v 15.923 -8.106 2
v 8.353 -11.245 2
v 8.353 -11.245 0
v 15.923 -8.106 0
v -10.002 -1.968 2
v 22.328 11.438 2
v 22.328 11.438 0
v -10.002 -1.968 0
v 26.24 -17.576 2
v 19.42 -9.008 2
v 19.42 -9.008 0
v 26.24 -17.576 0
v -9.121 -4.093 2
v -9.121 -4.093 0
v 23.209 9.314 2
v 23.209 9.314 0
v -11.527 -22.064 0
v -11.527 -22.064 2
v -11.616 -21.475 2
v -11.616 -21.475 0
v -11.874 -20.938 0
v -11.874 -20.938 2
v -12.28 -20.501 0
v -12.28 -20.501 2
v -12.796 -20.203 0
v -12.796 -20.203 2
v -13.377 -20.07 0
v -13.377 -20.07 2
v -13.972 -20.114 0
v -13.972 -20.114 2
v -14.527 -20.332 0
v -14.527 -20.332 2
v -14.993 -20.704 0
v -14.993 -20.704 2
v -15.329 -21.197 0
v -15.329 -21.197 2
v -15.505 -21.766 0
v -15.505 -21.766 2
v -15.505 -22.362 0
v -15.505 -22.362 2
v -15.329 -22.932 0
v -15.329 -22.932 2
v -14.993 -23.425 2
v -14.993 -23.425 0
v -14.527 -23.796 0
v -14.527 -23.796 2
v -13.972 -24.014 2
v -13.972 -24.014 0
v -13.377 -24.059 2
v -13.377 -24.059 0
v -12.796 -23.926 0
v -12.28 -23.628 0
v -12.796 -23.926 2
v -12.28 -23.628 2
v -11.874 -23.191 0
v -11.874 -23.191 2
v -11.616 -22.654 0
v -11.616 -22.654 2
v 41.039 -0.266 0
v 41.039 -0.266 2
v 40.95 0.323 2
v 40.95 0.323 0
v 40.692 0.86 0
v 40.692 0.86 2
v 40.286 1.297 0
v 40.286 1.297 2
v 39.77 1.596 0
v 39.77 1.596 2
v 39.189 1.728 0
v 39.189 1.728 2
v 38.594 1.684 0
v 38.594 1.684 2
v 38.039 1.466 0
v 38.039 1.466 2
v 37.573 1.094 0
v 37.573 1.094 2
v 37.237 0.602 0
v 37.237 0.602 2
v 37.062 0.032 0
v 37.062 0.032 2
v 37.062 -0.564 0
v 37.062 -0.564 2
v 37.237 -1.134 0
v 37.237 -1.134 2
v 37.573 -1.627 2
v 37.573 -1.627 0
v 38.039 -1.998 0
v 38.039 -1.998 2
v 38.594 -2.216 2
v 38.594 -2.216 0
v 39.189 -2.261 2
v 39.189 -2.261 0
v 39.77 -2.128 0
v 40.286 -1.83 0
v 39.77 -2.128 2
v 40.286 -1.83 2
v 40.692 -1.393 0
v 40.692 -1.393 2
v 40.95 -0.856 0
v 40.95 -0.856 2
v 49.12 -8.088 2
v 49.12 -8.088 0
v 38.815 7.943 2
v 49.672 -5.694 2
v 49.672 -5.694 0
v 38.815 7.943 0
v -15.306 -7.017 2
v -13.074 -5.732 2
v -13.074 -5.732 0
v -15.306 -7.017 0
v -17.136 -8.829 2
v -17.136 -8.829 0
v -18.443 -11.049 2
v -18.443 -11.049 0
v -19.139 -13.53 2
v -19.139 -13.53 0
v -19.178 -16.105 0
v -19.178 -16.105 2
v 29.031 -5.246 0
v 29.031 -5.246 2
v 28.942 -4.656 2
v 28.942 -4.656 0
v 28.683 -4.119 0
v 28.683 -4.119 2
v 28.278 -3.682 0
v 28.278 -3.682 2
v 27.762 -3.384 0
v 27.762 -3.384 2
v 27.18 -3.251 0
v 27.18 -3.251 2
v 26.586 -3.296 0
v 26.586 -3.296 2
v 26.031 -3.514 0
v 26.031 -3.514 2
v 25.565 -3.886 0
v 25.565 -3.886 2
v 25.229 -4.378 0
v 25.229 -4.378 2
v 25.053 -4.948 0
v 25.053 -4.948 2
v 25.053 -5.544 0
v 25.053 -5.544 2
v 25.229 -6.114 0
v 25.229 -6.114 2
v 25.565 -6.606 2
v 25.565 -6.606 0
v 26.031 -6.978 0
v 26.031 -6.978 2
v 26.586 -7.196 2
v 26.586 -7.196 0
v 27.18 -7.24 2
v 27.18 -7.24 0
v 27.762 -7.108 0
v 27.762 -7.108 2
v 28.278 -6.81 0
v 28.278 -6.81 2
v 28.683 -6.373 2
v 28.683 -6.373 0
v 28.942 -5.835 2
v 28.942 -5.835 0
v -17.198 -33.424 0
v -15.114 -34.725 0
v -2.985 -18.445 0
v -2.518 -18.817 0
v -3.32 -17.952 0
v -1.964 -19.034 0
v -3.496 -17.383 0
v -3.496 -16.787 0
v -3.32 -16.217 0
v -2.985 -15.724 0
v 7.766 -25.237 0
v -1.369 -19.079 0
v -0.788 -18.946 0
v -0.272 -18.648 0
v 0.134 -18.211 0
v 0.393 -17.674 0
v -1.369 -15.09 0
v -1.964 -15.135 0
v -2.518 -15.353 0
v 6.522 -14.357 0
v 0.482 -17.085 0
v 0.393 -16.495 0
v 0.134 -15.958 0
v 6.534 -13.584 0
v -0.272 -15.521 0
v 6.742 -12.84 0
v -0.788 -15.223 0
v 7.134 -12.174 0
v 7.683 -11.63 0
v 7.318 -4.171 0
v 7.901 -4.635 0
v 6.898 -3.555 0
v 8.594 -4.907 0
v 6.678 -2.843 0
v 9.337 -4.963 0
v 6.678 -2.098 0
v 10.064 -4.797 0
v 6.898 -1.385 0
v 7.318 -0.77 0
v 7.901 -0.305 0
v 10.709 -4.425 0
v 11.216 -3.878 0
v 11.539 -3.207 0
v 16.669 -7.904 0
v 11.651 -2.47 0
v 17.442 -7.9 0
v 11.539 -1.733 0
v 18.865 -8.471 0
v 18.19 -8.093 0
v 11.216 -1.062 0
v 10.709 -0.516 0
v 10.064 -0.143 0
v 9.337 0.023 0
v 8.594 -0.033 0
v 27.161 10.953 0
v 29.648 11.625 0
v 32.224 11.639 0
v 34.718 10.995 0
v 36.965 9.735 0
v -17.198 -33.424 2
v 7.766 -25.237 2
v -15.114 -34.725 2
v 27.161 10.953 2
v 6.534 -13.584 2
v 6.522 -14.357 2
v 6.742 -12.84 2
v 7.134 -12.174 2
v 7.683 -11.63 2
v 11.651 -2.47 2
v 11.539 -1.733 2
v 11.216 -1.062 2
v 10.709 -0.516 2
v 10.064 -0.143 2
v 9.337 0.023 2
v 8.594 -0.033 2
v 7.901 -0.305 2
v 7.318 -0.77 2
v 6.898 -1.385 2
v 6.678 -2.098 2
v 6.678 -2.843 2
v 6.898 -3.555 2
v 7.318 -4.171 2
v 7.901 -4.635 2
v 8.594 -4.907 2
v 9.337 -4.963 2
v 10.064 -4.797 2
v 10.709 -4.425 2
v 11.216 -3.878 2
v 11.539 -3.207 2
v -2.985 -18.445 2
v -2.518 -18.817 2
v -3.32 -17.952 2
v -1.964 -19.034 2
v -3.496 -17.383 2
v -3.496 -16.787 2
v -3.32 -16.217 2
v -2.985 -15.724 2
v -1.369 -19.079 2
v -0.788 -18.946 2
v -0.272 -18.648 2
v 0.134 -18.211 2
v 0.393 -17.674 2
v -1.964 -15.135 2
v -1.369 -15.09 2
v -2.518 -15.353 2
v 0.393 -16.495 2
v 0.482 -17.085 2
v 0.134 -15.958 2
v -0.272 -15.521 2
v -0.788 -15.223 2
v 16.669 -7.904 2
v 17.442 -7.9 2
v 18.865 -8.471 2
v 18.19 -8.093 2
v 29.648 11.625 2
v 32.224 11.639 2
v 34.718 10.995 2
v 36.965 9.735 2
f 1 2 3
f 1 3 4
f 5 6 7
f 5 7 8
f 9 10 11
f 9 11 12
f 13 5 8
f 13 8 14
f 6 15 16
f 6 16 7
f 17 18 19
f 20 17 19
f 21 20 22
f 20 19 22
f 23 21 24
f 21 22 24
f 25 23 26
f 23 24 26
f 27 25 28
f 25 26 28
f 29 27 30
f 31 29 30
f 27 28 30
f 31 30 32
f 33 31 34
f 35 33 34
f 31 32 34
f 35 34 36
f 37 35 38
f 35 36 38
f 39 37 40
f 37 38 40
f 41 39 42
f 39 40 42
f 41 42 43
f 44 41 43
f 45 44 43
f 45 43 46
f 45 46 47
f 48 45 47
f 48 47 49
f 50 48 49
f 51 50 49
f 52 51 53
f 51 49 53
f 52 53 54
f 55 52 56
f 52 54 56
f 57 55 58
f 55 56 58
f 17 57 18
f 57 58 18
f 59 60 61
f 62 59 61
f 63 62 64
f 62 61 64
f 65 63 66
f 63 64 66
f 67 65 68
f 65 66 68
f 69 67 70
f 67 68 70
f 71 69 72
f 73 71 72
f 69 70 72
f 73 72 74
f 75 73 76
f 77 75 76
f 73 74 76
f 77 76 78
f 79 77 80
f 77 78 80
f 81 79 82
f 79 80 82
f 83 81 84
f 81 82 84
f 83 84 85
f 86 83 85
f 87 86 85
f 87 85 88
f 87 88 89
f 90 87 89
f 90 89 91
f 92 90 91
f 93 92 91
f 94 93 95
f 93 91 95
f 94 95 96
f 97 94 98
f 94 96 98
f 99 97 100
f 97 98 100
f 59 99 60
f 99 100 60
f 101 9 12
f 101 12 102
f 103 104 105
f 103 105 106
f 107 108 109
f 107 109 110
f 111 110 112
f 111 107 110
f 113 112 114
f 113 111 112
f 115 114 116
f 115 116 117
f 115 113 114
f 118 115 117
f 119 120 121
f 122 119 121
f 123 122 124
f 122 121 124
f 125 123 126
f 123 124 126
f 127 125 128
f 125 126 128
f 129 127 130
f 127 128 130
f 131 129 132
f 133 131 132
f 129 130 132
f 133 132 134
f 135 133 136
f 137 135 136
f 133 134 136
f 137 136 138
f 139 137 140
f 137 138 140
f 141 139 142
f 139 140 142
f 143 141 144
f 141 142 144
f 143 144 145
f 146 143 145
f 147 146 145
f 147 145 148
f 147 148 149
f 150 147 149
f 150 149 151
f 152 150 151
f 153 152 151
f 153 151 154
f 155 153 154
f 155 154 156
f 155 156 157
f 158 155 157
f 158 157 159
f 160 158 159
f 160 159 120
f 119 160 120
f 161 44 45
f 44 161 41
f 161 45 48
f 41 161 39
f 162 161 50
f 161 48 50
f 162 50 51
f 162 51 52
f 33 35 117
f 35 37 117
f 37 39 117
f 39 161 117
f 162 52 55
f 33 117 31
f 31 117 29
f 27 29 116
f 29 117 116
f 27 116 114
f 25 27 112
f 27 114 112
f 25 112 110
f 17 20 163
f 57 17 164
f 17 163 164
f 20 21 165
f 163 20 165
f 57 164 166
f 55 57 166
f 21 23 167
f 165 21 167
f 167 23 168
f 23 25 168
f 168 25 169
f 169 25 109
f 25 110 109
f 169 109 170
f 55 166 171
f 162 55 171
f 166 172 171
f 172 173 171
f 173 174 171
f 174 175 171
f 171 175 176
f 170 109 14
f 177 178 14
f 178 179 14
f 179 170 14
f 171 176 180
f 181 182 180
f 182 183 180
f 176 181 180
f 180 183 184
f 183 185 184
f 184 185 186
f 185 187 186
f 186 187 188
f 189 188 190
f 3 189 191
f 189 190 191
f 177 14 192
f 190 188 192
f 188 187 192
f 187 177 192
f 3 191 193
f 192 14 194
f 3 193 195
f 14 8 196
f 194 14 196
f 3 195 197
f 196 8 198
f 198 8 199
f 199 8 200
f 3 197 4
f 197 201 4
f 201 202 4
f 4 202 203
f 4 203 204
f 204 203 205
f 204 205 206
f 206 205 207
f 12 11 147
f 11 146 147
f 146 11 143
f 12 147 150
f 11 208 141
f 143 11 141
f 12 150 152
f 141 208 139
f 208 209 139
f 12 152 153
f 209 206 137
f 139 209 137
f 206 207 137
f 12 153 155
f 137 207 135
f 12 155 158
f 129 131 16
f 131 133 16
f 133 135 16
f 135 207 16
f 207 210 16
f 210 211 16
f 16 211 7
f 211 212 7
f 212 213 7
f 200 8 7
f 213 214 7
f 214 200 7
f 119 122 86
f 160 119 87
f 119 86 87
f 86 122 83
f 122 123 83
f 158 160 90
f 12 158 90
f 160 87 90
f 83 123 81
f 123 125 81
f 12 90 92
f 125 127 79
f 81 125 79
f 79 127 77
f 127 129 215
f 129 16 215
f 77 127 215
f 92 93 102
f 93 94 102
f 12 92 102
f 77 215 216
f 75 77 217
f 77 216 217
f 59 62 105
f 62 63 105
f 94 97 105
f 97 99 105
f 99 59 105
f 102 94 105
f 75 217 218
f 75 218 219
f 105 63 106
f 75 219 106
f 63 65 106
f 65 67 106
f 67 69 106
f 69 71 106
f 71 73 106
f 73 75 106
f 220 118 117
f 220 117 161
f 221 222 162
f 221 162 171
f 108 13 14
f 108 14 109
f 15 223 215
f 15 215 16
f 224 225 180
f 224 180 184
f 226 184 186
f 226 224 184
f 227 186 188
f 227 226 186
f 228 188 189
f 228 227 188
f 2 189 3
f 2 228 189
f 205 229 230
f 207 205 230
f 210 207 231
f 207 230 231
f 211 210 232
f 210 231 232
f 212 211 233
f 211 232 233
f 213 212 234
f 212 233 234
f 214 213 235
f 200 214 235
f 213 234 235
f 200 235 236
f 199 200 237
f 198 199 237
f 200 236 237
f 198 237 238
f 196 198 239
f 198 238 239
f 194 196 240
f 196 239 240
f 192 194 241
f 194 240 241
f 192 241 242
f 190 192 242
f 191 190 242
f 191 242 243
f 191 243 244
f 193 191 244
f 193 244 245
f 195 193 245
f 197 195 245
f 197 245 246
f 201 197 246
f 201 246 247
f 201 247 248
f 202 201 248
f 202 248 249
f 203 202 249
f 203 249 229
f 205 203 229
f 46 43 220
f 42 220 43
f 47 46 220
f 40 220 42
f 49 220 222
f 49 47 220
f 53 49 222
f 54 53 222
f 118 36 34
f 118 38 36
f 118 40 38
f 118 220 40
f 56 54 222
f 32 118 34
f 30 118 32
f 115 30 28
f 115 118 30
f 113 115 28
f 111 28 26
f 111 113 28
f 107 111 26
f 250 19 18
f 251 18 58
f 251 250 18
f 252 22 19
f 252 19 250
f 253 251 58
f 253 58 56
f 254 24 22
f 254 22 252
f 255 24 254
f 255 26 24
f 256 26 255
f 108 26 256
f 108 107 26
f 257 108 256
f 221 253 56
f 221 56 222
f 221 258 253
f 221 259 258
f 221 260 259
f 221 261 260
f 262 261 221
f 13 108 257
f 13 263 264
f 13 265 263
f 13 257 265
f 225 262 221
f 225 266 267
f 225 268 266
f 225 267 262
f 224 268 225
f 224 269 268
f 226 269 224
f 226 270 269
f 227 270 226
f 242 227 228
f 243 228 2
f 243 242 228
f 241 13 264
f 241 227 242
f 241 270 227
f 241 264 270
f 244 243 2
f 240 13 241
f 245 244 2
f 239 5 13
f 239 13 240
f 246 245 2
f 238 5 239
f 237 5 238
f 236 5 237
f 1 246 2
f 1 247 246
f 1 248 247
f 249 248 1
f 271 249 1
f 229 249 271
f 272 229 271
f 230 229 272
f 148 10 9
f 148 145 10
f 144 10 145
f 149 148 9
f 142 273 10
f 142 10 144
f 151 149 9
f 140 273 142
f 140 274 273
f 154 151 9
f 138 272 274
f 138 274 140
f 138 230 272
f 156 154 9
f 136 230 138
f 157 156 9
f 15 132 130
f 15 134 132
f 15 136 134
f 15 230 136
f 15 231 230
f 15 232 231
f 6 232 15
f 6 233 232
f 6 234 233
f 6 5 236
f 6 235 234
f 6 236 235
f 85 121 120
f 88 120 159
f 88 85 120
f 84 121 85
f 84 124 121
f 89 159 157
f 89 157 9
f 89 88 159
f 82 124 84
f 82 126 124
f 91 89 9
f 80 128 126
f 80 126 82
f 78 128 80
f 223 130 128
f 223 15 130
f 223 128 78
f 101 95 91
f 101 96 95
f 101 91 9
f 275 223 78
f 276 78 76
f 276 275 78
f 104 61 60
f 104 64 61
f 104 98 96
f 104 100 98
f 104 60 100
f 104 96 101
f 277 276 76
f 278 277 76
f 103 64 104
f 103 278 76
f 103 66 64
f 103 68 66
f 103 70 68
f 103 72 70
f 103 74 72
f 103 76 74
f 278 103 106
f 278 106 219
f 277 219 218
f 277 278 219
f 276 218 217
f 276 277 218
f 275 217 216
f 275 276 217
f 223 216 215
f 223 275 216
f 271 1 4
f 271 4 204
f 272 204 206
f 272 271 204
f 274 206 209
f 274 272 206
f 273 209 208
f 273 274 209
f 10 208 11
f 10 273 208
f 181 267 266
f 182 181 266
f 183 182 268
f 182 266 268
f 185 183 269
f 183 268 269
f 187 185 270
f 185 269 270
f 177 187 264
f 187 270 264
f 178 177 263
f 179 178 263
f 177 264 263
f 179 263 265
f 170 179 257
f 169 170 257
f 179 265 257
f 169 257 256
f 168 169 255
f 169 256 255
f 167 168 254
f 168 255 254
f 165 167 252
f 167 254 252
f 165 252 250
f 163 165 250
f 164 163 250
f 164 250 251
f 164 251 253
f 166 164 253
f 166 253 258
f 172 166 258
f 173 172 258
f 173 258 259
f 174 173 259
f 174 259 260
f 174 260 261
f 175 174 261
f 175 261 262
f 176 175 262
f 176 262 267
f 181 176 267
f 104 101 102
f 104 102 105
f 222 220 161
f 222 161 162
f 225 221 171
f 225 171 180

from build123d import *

# Parameters (mm, degrees)
SKETCH_1_W          = 178.1038796
SKETCH_1_H          = 112.631890056
EXTRUDE_1_DEPTH     = 2
SKETCH_2_OUTSIDE_W  = 222.252
SKETCH_2_OUTSIDE_H  = 156.78
CUT_EXTRUDE_1_DEPTH = 2
SKETCH_3_R          = 2
CUT_EXTRUDE_2_DEPTH = 2
SKETCH_4_R          = 2
CUT_EXTRUDE_3_DEPTH = 10
SKETCH_5_R          = 2.5
CUT_EXTRUDE_4_DEPTH = 10


with BuildPart() as part:
    # 草图1 → 凸台-拉伸1 (new body)
    with BuildSketch(Plane.XY):
        Rectangle(SKETCH_1_W, SKETCH_1_H)
    extrude(amount=EXTRUDE_1_DEPTH)

    # 草图2 outside → 切除-拉伸1 (cut)
    with BuildSketch(Plane.XY.offset(2)):
        Rectangle(SKETCH_2_OUTSIDE_W, SKETCH_2_OUTSIDE_H)
        with BuildLine():
            Line((19.419678114, -9.00835621), (26.240314518, -17.576109786))
            Line((26.240314518, -17.576109786), (49.120442624, -8.088240876))
            Line((49.120442624, -8.088240876), (49.672051155, -5.694361888))
            Line((49.672051155, -5.694361888), (38.815198664, 7.943491127))
            ThreePointArc((38.815198664, 7.943491127), (33.491549784, 11.397714714), (27.161091097, 10.952528456))
            Line((27.161091097, 10.952528456), (23.209000469, 9.31368633))
            Line((23.209000469, 9.31368633), (22.32798775, 11.438260779))
            Line((22.32798775, 11.438260779), (-10.002492997, -1.968454504))
            Line((-10.002492997, -1.968454504), (-9.121480278, -4.093028953))
            Line((-9.121480278, -4.093028953), (-13.073570906, -5.731871079))
            ThreePointArc((-13.073570906, -5.731871079), (-17.86138023, -9.897177774), (-19.178350627, -16.105115191))
            Line((-19.178350627, -16.105115191), (-17.198178577, -33.42392576))
            Line((-17.198178577, -33.42392576), (-15.114374014, -34.724958857))
            Line((-15.114374014, -34.724958857), (7.765754091, -25.237089947))
            Line((7.765754091, -25.237089947), (6.521744045, -14.356836213))
            ThreePointArc((6.521744045, -14.356836213), (6.916835164, -12.494454989), (8.353177961, -11.24486298))
            Line((8.353177961, -11.24486298), (15.923445844, -8.105645011))
            ThreePointArc((15.923445844, -8.105645011), (17.82258345, -7.972089134), (19.419678114, -9.00835621))
        make_face(mode=Mode.SUBTRACT)
    extrude(amount=-CUT_EXTRUDE_1_DEPTH, mode=Mode.SUBTRACT)

    # 草图3 → 切除-拉伸2 (cut)
    with BuildSketch(Plane.XY.offset(2)):
        with Locations((39.039313187, -0.266244108)):
            Circle(SKETCH_3_R)
        with Locations((-13.526945878, -22.064276566)):
            Circle(SKETCH_3_R)
    extrude(amount=-CUT_EXTRUDE_2_DEPTH, mode=Mode.SUBTRACT)

    # 草图4 → 切除-拉伸3 (cut)
    with BuildSketch(Plane.XY.offset(2)):
        with Locations((-1.5184816, -17.084639461)):
            Circle(SKETCH_4_R)
        with Locations((27.030848909, -5.245881212)):
            Circle(SKETCH_4_R)
    extrude(amount=-CUT_EXTRUDE_3_DEPTH, mode=Mode.SUBTRACT)

    # 草图5 → 切除-拉伸4 (cut)
    with BuildSketch(Plane.XY.offset(2)):
        with Locations((9.15052964, -2.470175429)):
            Circle(SKETCH_5_R)
    extrude(amount=-CUT_EXTRUDE_4_DEPTH, mode=Mode.SUBTRACT)


solid = part.part
